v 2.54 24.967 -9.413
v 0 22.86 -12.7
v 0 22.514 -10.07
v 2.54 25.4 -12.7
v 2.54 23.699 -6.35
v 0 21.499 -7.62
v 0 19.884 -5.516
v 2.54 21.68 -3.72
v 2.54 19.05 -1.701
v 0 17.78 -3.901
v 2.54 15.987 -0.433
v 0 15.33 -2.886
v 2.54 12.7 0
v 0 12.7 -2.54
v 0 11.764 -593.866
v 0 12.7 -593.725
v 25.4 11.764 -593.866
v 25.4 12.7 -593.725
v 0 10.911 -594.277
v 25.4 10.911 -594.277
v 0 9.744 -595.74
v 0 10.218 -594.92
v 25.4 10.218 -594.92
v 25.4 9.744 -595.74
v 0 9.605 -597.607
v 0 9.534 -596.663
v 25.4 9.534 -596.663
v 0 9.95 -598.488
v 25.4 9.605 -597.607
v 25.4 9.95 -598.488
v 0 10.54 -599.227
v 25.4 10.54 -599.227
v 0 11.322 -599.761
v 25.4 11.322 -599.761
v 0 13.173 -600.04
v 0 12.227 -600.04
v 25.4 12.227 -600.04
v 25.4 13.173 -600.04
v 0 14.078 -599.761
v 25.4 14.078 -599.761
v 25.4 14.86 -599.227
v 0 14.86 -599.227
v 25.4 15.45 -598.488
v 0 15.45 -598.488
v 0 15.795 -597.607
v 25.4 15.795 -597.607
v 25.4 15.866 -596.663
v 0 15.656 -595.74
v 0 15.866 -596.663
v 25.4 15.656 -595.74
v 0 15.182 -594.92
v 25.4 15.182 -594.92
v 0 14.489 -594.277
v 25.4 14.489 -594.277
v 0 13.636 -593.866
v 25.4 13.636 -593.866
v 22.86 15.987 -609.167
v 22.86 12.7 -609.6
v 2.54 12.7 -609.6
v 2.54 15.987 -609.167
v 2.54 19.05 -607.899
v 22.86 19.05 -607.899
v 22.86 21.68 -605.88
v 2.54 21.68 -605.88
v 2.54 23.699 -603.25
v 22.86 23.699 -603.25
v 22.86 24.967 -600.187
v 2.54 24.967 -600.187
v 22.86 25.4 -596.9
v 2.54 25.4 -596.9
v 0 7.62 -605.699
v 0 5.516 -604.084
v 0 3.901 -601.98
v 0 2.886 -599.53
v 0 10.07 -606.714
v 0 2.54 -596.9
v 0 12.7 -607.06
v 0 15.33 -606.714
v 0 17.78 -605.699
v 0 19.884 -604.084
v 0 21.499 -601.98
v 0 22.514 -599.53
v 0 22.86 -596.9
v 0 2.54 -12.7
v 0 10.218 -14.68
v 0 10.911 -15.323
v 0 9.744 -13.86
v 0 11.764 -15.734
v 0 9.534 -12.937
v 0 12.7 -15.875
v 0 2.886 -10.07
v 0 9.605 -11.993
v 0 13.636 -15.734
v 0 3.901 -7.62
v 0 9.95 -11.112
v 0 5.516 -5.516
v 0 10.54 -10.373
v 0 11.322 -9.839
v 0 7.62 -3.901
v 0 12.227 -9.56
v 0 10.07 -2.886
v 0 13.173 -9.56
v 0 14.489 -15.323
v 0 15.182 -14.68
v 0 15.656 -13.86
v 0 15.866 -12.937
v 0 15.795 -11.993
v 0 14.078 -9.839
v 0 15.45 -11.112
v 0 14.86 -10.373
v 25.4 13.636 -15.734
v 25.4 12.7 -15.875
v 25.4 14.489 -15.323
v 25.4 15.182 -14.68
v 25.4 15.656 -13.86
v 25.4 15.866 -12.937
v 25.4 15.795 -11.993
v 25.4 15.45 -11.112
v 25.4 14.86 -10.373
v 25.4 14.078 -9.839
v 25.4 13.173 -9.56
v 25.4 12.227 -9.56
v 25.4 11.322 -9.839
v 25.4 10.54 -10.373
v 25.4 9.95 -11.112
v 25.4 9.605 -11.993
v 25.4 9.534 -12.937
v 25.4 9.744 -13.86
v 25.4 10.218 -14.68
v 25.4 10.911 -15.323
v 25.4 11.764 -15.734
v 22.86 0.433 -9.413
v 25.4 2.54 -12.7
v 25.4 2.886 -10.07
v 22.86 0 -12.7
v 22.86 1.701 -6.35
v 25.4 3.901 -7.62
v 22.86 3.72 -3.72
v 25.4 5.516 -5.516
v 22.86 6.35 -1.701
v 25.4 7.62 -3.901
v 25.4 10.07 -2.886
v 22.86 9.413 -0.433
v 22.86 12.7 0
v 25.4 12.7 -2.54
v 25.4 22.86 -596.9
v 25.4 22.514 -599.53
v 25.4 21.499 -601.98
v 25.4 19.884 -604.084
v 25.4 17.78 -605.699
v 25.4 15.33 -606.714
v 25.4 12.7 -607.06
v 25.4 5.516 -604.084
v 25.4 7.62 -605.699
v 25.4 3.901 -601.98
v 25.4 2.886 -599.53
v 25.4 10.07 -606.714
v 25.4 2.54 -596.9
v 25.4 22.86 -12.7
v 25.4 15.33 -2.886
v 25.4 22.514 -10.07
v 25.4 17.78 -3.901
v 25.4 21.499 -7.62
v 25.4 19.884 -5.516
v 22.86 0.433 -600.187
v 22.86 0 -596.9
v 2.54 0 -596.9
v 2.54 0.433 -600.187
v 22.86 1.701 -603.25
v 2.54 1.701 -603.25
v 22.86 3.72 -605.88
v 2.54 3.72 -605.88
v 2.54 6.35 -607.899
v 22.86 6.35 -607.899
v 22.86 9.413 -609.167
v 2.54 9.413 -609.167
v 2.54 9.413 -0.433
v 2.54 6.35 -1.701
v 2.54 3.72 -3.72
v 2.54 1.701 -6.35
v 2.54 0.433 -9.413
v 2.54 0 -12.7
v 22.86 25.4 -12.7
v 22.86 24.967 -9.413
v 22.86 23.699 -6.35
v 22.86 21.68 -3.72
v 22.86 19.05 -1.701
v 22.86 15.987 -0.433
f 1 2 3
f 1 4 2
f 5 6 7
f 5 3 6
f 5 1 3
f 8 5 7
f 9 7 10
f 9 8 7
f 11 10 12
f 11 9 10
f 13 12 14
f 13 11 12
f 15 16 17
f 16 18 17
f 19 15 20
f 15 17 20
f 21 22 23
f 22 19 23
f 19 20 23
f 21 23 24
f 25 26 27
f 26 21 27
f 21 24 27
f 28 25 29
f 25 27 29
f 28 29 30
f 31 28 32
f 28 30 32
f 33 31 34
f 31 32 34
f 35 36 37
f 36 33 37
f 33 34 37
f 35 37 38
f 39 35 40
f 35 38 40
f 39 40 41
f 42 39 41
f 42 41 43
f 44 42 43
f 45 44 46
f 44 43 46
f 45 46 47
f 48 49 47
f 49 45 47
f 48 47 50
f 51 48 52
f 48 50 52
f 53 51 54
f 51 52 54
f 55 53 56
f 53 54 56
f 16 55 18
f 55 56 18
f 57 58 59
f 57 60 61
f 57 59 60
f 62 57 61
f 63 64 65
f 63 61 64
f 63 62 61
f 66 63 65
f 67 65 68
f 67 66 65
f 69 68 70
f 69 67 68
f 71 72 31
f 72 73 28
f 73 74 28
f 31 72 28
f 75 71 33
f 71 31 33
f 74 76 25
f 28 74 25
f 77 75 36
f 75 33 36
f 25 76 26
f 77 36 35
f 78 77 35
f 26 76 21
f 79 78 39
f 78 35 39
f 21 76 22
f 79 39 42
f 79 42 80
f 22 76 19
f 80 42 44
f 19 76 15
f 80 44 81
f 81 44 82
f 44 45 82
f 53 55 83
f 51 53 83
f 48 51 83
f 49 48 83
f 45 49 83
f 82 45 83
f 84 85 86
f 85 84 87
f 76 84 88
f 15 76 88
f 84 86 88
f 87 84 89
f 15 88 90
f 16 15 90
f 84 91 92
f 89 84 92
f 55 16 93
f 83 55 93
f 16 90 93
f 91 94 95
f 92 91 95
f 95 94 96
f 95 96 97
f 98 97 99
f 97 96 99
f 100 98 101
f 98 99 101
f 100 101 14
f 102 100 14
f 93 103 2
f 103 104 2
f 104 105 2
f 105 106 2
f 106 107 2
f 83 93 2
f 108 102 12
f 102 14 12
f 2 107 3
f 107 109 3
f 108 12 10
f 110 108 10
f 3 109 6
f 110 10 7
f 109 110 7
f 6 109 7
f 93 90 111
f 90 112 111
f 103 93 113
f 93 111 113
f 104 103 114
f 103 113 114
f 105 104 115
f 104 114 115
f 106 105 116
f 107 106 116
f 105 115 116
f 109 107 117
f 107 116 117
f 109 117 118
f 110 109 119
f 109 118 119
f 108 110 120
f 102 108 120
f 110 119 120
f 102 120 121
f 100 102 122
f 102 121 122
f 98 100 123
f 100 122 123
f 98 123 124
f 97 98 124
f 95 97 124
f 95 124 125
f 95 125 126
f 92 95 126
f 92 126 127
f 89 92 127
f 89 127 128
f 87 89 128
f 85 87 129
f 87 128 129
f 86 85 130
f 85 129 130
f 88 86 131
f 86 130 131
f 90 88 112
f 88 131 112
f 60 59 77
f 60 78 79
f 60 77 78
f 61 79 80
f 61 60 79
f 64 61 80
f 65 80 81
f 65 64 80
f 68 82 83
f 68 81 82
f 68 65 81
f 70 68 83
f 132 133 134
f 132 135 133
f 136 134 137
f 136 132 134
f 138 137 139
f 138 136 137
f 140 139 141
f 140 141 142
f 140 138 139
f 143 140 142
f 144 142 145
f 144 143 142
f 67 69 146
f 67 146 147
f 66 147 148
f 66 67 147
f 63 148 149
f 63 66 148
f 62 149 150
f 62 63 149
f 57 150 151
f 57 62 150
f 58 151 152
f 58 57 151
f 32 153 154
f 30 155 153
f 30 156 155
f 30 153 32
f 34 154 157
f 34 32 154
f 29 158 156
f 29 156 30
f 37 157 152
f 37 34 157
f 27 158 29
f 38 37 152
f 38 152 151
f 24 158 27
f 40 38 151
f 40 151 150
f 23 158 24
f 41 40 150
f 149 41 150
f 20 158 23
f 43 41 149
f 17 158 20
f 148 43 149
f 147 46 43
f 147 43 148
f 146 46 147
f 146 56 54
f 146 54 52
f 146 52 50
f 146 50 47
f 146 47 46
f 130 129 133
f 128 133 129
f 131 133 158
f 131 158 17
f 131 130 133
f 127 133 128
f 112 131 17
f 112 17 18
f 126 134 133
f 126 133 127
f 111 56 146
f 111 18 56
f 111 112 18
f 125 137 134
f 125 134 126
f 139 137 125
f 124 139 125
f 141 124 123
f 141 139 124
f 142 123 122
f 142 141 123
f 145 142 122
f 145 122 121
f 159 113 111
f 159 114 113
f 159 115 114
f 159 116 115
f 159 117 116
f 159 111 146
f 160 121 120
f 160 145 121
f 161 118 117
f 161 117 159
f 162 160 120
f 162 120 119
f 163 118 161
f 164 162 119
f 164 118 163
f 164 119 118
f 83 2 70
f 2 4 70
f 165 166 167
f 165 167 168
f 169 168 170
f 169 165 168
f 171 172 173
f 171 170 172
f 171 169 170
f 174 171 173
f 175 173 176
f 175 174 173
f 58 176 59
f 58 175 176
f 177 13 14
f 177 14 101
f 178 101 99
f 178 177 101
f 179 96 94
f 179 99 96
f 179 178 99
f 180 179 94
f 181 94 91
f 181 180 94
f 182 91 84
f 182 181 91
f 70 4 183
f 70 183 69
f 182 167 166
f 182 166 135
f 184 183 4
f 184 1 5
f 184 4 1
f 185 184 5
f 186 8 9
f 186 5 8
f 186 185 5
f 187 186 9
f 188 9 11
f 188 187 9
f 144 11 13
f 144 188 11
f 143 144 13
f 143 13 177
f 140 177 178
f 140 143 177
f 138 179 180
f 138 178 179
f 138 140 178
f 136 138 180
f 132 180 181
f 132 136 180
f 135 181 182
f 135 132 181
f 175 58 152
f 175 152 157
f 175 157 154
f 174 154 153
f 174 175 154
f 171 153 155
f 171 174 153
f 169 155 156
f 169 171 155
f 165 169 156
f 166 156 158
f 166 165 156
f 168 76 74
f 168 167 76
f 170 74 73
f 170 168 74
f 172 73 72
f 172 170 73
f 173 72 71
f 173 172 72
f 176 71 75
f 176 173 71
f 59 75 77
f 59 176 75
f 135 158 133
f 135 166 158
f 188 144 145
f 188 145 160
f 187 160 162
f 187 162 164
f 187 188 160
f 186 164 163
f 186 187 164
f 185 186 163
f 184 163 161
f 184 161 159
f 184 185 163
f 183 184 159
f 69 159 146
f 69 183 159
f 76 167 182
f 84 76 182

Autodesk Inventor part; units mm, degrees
ref_plane "YZ Plane" through (0, 0, 0) normal (1, 0, 0) x (0, 1, 0)
ref_plane "XZ Plane" through (0, 0, 0) normal (0, 1, 0) x (-1, 0, 0)
sketch "Sketch1" plane through (0, 0, 0) normal (1, 0, 0) x (0, 1, 0)
  line L0 (0, 0) -> (25.4, 0)
  line L1 (25.4, 0) -> (25.4, -609.6)
  line L2 (25.4, -609.6) -> (0, -609.6)
  line L3 (0, -609.6) -> (0, 0)
  dimension "d0" = 25.4
  dimension "d1" = 609.6
extrude "Extrusion1" add sketch "Sketch1" along normal blind 25.4
sketch "Sketch3" plane through (25.4, 0, 0) normal (1, 0, 0) x (0, 0, -1)
  circle A0 centre (12.7, 12.7) radius 12.7
  line L0 (609.6, 25.4) -> (0, 25.4) projected
  line L1 (0, 25.4) -> (0, 0) projected
  circle A1 centre (12.7, 12.7) radius 3.175
  dimension "d12" = 25.4
  dimension "d13" = 6.35
extrude "Extrusion3" cut sketch "Sketch3" against normal blind 25.4 contours A1
ref_plane "Work Plane1" through (0, 0, -304.8) normal (0, 0, 1) x (1, 0, 0)
mirror "Mirror1" about plane through (0, 0, -304.8) normal (0, 0, 1) of "Extrusion3"
fillet "Fillet1" radius 12.7 4 edges at (12.7, 25.4, 0) (12.7, 0, 0) (12.7, 25.4, -609.6) (12.7, 0, -609.6)
chamfer "Chamfer1" distance 2.54 angle 45 8 edges at (25.4, 25.4, -304.8) (25.4, 21.6803, -3.7197) (25.4, 0, -304.8) (25.4, 21.6803, -605.8803) (0, 25.4, -304.8) (0, 21.6803, -605.8803) (0, 0, -304.8) (0, 21.6803, -3.7197)
properties part number "bar"
